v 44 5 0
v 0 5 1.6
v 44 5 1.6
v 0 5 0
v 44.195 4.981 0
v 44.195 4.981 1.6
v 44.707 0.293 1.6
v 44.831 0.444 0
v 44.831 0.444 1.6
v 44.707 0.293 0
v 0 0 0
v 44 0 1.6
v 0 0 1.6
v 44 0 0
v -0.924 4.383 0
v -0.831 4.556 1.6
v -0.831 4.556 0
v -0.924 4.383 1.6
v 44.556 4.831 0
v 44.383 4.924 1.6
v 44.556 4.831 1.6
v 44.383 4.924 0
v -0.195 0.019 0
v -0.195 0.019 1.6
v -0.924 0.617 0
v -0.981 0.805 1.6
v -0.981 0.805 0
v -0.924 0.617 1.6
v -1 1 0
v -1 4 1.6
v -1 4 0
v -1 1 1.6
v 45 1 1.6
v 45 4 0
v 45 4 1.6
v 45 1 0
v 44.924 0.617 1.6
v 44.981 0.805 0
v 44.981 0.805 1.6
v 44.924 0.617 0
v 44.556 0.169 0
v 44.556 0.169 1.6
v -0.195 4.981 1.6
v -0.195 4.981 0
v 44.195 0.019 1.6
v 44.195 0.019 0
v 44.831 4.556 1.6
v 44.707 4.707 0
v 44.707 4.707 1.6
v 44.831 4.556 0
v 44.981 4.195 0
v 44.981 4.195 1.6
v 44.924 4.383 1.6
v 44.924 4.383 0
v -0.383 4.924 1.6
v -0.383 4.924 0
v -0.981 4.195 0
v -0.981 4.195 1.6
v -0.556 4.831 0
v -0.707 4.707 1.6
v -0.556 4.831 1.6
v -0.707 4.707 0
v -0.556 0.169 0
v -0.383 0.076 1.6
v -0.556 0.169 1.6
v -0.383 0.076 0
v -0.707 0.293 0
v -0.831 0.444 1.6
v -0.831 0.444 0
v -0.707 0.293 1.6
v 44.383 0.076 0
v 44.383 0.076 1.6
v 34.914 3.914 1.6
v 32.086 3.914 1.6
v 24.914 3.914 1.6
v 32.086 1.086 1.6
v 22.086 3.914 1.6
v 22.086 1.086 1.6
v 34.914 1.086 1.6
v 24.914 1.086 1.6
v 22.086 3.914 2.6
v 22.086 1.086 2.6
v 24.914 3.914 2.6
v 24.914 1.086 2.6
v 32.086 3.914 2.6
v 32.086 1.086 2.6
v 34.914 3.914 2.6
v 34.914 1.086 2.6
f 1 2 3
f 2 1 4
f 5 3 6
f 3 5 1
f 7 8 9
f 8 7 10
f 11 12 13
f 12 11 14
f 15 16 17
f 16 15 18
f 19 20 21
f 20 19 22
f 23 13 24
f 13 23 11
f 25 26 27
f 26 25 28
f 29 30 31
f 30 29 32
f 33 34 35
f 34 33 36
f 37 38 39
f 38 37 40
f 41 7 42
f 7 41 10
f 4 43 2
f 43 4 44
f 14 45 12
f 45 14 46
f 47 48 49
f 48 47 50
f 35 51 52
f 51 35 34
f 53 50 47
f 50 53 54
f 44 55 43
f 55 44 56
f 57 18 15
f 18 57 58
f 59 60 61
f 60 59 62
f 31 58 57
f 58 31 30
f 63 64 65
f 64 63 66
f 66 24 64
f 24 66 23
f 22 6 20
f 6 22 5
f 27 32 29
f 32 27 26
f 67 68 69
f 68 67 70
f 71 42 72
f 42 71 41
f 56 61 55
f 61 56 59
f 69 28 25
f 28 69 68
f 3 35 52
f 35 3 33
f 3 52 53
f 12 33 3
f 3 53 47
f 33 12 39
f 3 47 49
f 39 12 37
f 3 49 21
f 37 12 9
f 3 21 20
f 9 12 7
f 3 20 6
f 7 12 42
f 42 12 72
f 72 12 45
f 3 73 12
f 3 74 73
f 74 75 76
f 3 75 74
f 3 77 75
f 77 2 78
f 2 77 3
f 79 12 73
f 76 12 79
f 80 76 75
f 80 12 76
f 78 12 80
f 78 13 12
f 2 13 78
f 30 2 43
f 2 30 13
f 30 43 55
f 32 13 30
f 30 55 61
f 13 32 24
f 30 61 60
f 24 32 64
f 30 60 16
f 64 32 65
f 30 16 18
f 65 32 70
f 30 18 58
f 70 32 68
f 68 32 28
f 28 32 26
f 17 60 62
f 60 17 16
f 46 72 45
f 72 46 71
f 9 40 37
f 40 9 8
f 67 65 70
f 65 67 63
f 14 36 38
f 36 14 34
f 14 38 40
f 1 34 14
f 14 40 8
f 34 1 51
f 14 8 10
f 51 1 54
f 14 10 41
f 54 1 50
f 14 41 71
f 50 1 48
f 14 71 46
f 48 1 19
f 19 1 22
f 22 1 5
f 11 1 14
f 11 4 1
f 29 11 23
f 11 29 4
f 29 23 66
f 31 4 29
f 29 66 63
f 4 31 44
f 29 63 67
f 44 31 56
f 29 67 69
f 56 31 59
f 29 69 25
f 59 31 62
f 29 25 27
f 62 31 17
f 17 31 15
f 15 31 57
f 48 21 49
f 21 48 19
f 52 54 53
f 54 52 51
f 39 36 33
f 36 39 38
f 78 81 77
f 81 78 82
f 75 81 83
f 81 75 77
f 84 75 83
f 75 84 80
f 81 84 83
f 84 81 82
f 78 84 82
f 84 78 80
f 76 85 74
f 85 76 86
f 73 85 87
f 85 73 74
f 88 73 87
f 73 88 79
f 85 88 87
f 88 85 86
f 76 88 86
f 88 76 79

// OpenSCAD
// file: electronics.scad
/**
 * Martin Egli
 * 2026-11-08
 */

module arrow(col = "Gold", th = 0.1, loc_res = 32) {
    color(col) {
        hull() {
            translate([0, 0, 0])
            cylinder(d = 1, h = th, $fn = loc_res);
            translate([-5, -8, 0])
            cylinder(d = 1, h = th, $fn = loc_res);
            translate([+5, -8, 0])
            cylinder(d = 1, h = th, $fn = loc_res);
        }
        hull() {
            translate([-2, -8, 0])
            cylinder(d = 1, h = th, $fn = loc_res);
            translate([+2, -8, 0])
            cylinder(d = 1, h = th, $fn = loc_res);
            translate([-2, -16, 0])
            cylinder(d = 1, h = th, $fn = loc_res);
            translate([+2, -16, 0])
            cylinder(d = 1, h = th, $fn = loc_res);
        }
    }
}

module led(col = "White", loc_res = 32) {
    color(col)
    translate([-5/2, -5/2, 0])
    cube([5, 5, 1.5]);
}

module neopixelpanel8x8(col = "DarkGray", th = 1.6, loc_res = 32) {
    difference() {
        union() {
            color(col)
            translate([-(7+3./2), -(7+3./2), 0])
            cube([67, 68, th]);
            
            translate([50, 10, -0.1])
            arrow();
            translate([0, 55, -0.1])
            arrow();
            
            
            for(x = [0:1:7])
                for(y = [0:1:7])
                    translate([x*8.2-(6.6-5/2), y*8.5-(6.6-5/2), th])
                    led();
        }
        // this hole is origin
        translate([0, 0, -1])
        cylinder(d = 3, h = th+2, $fn = loc_res);
        translate([46.3+3, 0, -1])
        cylinder(d = 3, h = th+2, $fn = loc_res);
        translate([0, 22.5+3, -1])
        cylinder(d = 3, h = th+2, $fn = loc_res);
        translate([46.3+3, 22.5+3, -1])
        cylinder(d = 3, h = th+2, $fn = loc_res);
        translate([0, 48.0+3, -1])
        cylinder(d = 3, h = th+2, $fn = loc_res);
        translate([46.3+3, 48.0+3, -1])
        cylinder(d = 3, h = th+2, $fn = loc_res);
    }
}
*neopixelpanel8x8();

module neopixelpanel8x8_cut(len = 4, dia1 = 6, m3len = 3, m3_dia = 3, loc_res = 32) {
    *neopixelpanel8x8(loc_res = loc_res);
    // cuts for leds
    for(x = [0:1:7])
        for(y = [0:1:7])
            translate([x*8.2-(6.6-5/2), y*8.5-(6.6-5/2), 0])
            cylinder(d = dia1, h = len, $fn = loc_res);
    // this hole is origin
    translate([0, 0, 0])
    cylinder(d = m3_dia, h = m3len, $fn = loc_res);
    translate([46.3+3, 0, 0])
    cylinder(d = m3_dia, h = m3len, $fn = loc_res);
    translate([0, 22.5+3, 0])
    cylinder(d = m3_dia, h = m3len, $fn = loc_res);
    translate([46.3+3, 22.5+3, 0])
    cylinder(d = m3_dia, h = m3len, $fn = loc_res);
    translate([0, 48.0+3, 0])
    cylinder(d = m3_dia, h = m3len, $fn = loc_res);
    translate([46.3+3, 48.0+3, 0])
    cylinder(d = m3_dia, h = m3len, $fn = loc_res);
}
*neopixelpanel8x8_cut();

module buttonPTS526(col = "Silver", loc_res = 32) {
// origin in the middle, at the bottom
    color(col) {
        hull() {
            translate([-3/2, -4.8/2, 0])
            cube([3, 4.8, 1]);
            translate([-4.8/2, -3/2, 0])
            cube([4.8, 3, 1]);
        }
        translate([0, 0, 0])
        cylinder(d =2, h = 1.5, $fn = loc_res);
    }
}
*buttonPTS526();

module esp32c3supermini(col = "DarkGray", th = 1.6, loc_res = 32) {
    difference() {
        union() {
            // PCB
            color(col)
            translate([-18/2, 0, 0])
            cube([18, 23, th]);
            // USB-C
            color("LightGray")
            translate([0, 7.5-1.5, th+3/2])
            rotate([90, 0, 0])
            hull() {
                translate([+(9-3)/2, 0, 0])
                cylinder(d= 3, h = 7.5, $fn = loc_res);
                translate([-(9-3)/2, 0, 0])
                cylinder(d= 3, h = 7.5, $fn = loc_res);
            }
            // pins
            for(n = [0:1:7]) {
                translate([+(15.2/2), n*2.54+1.5, -0.1])
                cylinder(d = 1.8, h = th + 0.2, $fn = loc_res);
                translate([-(15.2/2), n*2.54+1.5, -0.1])
                cylinder(d = 1.8, h = th + 0.2, $fn = loc_res);
            }
            // "headers"
            color("White")
            for(n = [0:1:7]) {
                translate([+(15.2/2)-2.54/2, n*2.54+1.5-2.54/2, -2.54])
                cube(2.54);
                translate([-(15.2/2)-2.54/2, n*2.54+1.5-2.54/2, -2.54])
                cube(2.54);
            }
        }
        // holes
        for(n = [0:1:7]) {
            translate([+(15.2/2), n*2.54+1.5, -0.2])
            cylinder(d = 1.0, h = th + 0.4, $fn = loc_res);
            translate([-(15.2/2), n*2.54+1.5, -0.2])
            cylinder(d = 1.0, h = th + 0.4, $fn = loc_res);
        }
    }
    
}
module dfplayer_mini(col = "DarkGray", th = 1.6, loc_res = 32) {
            // PCB
            color(col)
            translate([-21.2/2, 0, 0])
            cube([21.2, 20.55, th]);
            // usdcard
            color("LightGray")
            translate([-15.0/2, 0, th])
            cube([15.0, 15.5, th]);
            color("black")
            translate([-14.0/2, -3, th])
            cube([11.0, 15.5, 1]);
            // "headers"
            color("Black")
            for(n = [0:1:7]) {
                translate([+(7*2.54)/2-2.54/2, n*2.54+1.5-2.54/2, -2.54])
                cube(2.54);
                translate([-(7*2.54)/2-2.54/2, n*2.54+1.5-2.54/2, -2.54])
                cube(2.54);
            }
}
*dfplayer_mini();
// main file
/**
 * Martin Egli
 * 2026-11-08
 */
use <electronics.scad>

module esp32c3_lighthouse_main(col = "Green", th = 1.6, loc_res = 32) {
    translate([0, 0, th+2.54])
    esp32c3supermini(loc_res = loc_res);
    
    translate([-23, 0, th+2.54])
    dfplayer_mini();
    
    color(col)
    difference() {
        // PCB
        hull() {
            translate([+88/2, 1, 0])
            cylinder(r = 1, h = th, $fn = loc_res);
            translate([-88/2, 1, 0])
            cylinder(r = 1, h = th, $fn = loc_res);
            translate([+88/2, 1+21, 0])
            cylinder(r = 1, h = th, $fn = loc_res);
            translate([-88/2, 1+21, 0])
            cylinder(r = 1, h = th, $fn = loc_res);
        }
        // holes
        translate([+81/2, 2.5, -1])
        cylinder(r = 1.6, h = th+2, $fn = loc_res);
        translate([-81/2, 2.5, -1])
        cylinder(r = 1.6, h = th+2, $fn = loc_res);
        translate([+81/2, 2.5+18, -1])
        cylinder(r = 1.6, h = th+2, $fn = loc_res);
        translate([-81/2, 2.5+18, -1])
        cylinder(r = 1.6, h = th+2, $fn = loc_res);
    }    
}
*esp32c3_lighthouse_main();

module esp32c3_lighthouse_main_hole_cut(len = 10, loc_res = 32) {
    // holes
    translate([+81/2, 2.5, 0])
    cylinder(r = 1.6, h = len, $fn = loc_res);
    translate([-81/2, 2.5, 0])
    cylinder(r = 1.6, h = len, $fn = loc_res);
    translate([+81/2, 2.5+18, 0])
    cylinder(r = 1.6, h = len, $fn = loc_res);
    translate([-81/2, 2.5+18, 0])
    cylinder(r = 1.6, h = len, $fn = loc_res);
}

module esp32c3_lighthouse_buttons(col = "Green", th = 1.6, loc_res = 32) {
    color(col)
    difference() {
        // PCB
        hull() {
            translate([+88/2, 1, 0])
            cylinder(r = 1, h = th, $fn = loc_res);
            translate([-88/2, 1, 0])
            cylinder(r = 1, h = th, $fn = loc_res);
            translate([+88/2, 1+6, 0])
            cylinder(r = 1, h = th, $fn = loc_res);
            translate([-88/2, 1+6, 0])
            cylinder(r = 1, h = th, $fn = loc_res);
        }
        // holes
        translate([+37/2, 4, -1])
        cylinder(r = 1.6, h = th+2, $fn = loc_res);
        translate([-37/2, 4, -1])
        cylinder(r = 1.6, h = th+2, $fn = loc_res);
    }
    translate([0, 4, th])
    buttonPTS526(loc_res = loc_res);
    translate([37, 4, th])
    buttonPTS526(loc_res = loc_res);
    translate([-37, 4, th])
    buttonPTS526(loc_res = loc_res);
}
*esp32c3_lighthouse_buttons();

module esp32c3_lighthouse_sensors(col = "Green", th = 1.6, loc_res = 32) {
    color(col)
    difference() {
        // PCB
        hull() {
            translate([+88/2, 1, 0])
            cylinder(r = 1, h = th, $fn = loc_res);
            translate([0, 1, 0])
            cylinder(r = 1, h = th, $fn = loc_res);
            translate([+88/2, 1+3, 0])
            cylinder(r = 1, h = th, $fn = loc_res);
            translate([0, 1+3, 0])
            cylinder(r = 1, h = th, $fn = loc_res);
        }
    }
    // lightsensor
    translate([23.5, 5/2, th])
    rotate([0, 0, 45])
    cylinder(r = 2, h = 1, $fn = 4);
    // rh-sensor
    translate([33.5, 5/2, th])
    rotate([0, 0, 45])
    cylinder(r = 2, h = 1, $fn = 4);
}
esp32c3_lighthouse_sensors();
